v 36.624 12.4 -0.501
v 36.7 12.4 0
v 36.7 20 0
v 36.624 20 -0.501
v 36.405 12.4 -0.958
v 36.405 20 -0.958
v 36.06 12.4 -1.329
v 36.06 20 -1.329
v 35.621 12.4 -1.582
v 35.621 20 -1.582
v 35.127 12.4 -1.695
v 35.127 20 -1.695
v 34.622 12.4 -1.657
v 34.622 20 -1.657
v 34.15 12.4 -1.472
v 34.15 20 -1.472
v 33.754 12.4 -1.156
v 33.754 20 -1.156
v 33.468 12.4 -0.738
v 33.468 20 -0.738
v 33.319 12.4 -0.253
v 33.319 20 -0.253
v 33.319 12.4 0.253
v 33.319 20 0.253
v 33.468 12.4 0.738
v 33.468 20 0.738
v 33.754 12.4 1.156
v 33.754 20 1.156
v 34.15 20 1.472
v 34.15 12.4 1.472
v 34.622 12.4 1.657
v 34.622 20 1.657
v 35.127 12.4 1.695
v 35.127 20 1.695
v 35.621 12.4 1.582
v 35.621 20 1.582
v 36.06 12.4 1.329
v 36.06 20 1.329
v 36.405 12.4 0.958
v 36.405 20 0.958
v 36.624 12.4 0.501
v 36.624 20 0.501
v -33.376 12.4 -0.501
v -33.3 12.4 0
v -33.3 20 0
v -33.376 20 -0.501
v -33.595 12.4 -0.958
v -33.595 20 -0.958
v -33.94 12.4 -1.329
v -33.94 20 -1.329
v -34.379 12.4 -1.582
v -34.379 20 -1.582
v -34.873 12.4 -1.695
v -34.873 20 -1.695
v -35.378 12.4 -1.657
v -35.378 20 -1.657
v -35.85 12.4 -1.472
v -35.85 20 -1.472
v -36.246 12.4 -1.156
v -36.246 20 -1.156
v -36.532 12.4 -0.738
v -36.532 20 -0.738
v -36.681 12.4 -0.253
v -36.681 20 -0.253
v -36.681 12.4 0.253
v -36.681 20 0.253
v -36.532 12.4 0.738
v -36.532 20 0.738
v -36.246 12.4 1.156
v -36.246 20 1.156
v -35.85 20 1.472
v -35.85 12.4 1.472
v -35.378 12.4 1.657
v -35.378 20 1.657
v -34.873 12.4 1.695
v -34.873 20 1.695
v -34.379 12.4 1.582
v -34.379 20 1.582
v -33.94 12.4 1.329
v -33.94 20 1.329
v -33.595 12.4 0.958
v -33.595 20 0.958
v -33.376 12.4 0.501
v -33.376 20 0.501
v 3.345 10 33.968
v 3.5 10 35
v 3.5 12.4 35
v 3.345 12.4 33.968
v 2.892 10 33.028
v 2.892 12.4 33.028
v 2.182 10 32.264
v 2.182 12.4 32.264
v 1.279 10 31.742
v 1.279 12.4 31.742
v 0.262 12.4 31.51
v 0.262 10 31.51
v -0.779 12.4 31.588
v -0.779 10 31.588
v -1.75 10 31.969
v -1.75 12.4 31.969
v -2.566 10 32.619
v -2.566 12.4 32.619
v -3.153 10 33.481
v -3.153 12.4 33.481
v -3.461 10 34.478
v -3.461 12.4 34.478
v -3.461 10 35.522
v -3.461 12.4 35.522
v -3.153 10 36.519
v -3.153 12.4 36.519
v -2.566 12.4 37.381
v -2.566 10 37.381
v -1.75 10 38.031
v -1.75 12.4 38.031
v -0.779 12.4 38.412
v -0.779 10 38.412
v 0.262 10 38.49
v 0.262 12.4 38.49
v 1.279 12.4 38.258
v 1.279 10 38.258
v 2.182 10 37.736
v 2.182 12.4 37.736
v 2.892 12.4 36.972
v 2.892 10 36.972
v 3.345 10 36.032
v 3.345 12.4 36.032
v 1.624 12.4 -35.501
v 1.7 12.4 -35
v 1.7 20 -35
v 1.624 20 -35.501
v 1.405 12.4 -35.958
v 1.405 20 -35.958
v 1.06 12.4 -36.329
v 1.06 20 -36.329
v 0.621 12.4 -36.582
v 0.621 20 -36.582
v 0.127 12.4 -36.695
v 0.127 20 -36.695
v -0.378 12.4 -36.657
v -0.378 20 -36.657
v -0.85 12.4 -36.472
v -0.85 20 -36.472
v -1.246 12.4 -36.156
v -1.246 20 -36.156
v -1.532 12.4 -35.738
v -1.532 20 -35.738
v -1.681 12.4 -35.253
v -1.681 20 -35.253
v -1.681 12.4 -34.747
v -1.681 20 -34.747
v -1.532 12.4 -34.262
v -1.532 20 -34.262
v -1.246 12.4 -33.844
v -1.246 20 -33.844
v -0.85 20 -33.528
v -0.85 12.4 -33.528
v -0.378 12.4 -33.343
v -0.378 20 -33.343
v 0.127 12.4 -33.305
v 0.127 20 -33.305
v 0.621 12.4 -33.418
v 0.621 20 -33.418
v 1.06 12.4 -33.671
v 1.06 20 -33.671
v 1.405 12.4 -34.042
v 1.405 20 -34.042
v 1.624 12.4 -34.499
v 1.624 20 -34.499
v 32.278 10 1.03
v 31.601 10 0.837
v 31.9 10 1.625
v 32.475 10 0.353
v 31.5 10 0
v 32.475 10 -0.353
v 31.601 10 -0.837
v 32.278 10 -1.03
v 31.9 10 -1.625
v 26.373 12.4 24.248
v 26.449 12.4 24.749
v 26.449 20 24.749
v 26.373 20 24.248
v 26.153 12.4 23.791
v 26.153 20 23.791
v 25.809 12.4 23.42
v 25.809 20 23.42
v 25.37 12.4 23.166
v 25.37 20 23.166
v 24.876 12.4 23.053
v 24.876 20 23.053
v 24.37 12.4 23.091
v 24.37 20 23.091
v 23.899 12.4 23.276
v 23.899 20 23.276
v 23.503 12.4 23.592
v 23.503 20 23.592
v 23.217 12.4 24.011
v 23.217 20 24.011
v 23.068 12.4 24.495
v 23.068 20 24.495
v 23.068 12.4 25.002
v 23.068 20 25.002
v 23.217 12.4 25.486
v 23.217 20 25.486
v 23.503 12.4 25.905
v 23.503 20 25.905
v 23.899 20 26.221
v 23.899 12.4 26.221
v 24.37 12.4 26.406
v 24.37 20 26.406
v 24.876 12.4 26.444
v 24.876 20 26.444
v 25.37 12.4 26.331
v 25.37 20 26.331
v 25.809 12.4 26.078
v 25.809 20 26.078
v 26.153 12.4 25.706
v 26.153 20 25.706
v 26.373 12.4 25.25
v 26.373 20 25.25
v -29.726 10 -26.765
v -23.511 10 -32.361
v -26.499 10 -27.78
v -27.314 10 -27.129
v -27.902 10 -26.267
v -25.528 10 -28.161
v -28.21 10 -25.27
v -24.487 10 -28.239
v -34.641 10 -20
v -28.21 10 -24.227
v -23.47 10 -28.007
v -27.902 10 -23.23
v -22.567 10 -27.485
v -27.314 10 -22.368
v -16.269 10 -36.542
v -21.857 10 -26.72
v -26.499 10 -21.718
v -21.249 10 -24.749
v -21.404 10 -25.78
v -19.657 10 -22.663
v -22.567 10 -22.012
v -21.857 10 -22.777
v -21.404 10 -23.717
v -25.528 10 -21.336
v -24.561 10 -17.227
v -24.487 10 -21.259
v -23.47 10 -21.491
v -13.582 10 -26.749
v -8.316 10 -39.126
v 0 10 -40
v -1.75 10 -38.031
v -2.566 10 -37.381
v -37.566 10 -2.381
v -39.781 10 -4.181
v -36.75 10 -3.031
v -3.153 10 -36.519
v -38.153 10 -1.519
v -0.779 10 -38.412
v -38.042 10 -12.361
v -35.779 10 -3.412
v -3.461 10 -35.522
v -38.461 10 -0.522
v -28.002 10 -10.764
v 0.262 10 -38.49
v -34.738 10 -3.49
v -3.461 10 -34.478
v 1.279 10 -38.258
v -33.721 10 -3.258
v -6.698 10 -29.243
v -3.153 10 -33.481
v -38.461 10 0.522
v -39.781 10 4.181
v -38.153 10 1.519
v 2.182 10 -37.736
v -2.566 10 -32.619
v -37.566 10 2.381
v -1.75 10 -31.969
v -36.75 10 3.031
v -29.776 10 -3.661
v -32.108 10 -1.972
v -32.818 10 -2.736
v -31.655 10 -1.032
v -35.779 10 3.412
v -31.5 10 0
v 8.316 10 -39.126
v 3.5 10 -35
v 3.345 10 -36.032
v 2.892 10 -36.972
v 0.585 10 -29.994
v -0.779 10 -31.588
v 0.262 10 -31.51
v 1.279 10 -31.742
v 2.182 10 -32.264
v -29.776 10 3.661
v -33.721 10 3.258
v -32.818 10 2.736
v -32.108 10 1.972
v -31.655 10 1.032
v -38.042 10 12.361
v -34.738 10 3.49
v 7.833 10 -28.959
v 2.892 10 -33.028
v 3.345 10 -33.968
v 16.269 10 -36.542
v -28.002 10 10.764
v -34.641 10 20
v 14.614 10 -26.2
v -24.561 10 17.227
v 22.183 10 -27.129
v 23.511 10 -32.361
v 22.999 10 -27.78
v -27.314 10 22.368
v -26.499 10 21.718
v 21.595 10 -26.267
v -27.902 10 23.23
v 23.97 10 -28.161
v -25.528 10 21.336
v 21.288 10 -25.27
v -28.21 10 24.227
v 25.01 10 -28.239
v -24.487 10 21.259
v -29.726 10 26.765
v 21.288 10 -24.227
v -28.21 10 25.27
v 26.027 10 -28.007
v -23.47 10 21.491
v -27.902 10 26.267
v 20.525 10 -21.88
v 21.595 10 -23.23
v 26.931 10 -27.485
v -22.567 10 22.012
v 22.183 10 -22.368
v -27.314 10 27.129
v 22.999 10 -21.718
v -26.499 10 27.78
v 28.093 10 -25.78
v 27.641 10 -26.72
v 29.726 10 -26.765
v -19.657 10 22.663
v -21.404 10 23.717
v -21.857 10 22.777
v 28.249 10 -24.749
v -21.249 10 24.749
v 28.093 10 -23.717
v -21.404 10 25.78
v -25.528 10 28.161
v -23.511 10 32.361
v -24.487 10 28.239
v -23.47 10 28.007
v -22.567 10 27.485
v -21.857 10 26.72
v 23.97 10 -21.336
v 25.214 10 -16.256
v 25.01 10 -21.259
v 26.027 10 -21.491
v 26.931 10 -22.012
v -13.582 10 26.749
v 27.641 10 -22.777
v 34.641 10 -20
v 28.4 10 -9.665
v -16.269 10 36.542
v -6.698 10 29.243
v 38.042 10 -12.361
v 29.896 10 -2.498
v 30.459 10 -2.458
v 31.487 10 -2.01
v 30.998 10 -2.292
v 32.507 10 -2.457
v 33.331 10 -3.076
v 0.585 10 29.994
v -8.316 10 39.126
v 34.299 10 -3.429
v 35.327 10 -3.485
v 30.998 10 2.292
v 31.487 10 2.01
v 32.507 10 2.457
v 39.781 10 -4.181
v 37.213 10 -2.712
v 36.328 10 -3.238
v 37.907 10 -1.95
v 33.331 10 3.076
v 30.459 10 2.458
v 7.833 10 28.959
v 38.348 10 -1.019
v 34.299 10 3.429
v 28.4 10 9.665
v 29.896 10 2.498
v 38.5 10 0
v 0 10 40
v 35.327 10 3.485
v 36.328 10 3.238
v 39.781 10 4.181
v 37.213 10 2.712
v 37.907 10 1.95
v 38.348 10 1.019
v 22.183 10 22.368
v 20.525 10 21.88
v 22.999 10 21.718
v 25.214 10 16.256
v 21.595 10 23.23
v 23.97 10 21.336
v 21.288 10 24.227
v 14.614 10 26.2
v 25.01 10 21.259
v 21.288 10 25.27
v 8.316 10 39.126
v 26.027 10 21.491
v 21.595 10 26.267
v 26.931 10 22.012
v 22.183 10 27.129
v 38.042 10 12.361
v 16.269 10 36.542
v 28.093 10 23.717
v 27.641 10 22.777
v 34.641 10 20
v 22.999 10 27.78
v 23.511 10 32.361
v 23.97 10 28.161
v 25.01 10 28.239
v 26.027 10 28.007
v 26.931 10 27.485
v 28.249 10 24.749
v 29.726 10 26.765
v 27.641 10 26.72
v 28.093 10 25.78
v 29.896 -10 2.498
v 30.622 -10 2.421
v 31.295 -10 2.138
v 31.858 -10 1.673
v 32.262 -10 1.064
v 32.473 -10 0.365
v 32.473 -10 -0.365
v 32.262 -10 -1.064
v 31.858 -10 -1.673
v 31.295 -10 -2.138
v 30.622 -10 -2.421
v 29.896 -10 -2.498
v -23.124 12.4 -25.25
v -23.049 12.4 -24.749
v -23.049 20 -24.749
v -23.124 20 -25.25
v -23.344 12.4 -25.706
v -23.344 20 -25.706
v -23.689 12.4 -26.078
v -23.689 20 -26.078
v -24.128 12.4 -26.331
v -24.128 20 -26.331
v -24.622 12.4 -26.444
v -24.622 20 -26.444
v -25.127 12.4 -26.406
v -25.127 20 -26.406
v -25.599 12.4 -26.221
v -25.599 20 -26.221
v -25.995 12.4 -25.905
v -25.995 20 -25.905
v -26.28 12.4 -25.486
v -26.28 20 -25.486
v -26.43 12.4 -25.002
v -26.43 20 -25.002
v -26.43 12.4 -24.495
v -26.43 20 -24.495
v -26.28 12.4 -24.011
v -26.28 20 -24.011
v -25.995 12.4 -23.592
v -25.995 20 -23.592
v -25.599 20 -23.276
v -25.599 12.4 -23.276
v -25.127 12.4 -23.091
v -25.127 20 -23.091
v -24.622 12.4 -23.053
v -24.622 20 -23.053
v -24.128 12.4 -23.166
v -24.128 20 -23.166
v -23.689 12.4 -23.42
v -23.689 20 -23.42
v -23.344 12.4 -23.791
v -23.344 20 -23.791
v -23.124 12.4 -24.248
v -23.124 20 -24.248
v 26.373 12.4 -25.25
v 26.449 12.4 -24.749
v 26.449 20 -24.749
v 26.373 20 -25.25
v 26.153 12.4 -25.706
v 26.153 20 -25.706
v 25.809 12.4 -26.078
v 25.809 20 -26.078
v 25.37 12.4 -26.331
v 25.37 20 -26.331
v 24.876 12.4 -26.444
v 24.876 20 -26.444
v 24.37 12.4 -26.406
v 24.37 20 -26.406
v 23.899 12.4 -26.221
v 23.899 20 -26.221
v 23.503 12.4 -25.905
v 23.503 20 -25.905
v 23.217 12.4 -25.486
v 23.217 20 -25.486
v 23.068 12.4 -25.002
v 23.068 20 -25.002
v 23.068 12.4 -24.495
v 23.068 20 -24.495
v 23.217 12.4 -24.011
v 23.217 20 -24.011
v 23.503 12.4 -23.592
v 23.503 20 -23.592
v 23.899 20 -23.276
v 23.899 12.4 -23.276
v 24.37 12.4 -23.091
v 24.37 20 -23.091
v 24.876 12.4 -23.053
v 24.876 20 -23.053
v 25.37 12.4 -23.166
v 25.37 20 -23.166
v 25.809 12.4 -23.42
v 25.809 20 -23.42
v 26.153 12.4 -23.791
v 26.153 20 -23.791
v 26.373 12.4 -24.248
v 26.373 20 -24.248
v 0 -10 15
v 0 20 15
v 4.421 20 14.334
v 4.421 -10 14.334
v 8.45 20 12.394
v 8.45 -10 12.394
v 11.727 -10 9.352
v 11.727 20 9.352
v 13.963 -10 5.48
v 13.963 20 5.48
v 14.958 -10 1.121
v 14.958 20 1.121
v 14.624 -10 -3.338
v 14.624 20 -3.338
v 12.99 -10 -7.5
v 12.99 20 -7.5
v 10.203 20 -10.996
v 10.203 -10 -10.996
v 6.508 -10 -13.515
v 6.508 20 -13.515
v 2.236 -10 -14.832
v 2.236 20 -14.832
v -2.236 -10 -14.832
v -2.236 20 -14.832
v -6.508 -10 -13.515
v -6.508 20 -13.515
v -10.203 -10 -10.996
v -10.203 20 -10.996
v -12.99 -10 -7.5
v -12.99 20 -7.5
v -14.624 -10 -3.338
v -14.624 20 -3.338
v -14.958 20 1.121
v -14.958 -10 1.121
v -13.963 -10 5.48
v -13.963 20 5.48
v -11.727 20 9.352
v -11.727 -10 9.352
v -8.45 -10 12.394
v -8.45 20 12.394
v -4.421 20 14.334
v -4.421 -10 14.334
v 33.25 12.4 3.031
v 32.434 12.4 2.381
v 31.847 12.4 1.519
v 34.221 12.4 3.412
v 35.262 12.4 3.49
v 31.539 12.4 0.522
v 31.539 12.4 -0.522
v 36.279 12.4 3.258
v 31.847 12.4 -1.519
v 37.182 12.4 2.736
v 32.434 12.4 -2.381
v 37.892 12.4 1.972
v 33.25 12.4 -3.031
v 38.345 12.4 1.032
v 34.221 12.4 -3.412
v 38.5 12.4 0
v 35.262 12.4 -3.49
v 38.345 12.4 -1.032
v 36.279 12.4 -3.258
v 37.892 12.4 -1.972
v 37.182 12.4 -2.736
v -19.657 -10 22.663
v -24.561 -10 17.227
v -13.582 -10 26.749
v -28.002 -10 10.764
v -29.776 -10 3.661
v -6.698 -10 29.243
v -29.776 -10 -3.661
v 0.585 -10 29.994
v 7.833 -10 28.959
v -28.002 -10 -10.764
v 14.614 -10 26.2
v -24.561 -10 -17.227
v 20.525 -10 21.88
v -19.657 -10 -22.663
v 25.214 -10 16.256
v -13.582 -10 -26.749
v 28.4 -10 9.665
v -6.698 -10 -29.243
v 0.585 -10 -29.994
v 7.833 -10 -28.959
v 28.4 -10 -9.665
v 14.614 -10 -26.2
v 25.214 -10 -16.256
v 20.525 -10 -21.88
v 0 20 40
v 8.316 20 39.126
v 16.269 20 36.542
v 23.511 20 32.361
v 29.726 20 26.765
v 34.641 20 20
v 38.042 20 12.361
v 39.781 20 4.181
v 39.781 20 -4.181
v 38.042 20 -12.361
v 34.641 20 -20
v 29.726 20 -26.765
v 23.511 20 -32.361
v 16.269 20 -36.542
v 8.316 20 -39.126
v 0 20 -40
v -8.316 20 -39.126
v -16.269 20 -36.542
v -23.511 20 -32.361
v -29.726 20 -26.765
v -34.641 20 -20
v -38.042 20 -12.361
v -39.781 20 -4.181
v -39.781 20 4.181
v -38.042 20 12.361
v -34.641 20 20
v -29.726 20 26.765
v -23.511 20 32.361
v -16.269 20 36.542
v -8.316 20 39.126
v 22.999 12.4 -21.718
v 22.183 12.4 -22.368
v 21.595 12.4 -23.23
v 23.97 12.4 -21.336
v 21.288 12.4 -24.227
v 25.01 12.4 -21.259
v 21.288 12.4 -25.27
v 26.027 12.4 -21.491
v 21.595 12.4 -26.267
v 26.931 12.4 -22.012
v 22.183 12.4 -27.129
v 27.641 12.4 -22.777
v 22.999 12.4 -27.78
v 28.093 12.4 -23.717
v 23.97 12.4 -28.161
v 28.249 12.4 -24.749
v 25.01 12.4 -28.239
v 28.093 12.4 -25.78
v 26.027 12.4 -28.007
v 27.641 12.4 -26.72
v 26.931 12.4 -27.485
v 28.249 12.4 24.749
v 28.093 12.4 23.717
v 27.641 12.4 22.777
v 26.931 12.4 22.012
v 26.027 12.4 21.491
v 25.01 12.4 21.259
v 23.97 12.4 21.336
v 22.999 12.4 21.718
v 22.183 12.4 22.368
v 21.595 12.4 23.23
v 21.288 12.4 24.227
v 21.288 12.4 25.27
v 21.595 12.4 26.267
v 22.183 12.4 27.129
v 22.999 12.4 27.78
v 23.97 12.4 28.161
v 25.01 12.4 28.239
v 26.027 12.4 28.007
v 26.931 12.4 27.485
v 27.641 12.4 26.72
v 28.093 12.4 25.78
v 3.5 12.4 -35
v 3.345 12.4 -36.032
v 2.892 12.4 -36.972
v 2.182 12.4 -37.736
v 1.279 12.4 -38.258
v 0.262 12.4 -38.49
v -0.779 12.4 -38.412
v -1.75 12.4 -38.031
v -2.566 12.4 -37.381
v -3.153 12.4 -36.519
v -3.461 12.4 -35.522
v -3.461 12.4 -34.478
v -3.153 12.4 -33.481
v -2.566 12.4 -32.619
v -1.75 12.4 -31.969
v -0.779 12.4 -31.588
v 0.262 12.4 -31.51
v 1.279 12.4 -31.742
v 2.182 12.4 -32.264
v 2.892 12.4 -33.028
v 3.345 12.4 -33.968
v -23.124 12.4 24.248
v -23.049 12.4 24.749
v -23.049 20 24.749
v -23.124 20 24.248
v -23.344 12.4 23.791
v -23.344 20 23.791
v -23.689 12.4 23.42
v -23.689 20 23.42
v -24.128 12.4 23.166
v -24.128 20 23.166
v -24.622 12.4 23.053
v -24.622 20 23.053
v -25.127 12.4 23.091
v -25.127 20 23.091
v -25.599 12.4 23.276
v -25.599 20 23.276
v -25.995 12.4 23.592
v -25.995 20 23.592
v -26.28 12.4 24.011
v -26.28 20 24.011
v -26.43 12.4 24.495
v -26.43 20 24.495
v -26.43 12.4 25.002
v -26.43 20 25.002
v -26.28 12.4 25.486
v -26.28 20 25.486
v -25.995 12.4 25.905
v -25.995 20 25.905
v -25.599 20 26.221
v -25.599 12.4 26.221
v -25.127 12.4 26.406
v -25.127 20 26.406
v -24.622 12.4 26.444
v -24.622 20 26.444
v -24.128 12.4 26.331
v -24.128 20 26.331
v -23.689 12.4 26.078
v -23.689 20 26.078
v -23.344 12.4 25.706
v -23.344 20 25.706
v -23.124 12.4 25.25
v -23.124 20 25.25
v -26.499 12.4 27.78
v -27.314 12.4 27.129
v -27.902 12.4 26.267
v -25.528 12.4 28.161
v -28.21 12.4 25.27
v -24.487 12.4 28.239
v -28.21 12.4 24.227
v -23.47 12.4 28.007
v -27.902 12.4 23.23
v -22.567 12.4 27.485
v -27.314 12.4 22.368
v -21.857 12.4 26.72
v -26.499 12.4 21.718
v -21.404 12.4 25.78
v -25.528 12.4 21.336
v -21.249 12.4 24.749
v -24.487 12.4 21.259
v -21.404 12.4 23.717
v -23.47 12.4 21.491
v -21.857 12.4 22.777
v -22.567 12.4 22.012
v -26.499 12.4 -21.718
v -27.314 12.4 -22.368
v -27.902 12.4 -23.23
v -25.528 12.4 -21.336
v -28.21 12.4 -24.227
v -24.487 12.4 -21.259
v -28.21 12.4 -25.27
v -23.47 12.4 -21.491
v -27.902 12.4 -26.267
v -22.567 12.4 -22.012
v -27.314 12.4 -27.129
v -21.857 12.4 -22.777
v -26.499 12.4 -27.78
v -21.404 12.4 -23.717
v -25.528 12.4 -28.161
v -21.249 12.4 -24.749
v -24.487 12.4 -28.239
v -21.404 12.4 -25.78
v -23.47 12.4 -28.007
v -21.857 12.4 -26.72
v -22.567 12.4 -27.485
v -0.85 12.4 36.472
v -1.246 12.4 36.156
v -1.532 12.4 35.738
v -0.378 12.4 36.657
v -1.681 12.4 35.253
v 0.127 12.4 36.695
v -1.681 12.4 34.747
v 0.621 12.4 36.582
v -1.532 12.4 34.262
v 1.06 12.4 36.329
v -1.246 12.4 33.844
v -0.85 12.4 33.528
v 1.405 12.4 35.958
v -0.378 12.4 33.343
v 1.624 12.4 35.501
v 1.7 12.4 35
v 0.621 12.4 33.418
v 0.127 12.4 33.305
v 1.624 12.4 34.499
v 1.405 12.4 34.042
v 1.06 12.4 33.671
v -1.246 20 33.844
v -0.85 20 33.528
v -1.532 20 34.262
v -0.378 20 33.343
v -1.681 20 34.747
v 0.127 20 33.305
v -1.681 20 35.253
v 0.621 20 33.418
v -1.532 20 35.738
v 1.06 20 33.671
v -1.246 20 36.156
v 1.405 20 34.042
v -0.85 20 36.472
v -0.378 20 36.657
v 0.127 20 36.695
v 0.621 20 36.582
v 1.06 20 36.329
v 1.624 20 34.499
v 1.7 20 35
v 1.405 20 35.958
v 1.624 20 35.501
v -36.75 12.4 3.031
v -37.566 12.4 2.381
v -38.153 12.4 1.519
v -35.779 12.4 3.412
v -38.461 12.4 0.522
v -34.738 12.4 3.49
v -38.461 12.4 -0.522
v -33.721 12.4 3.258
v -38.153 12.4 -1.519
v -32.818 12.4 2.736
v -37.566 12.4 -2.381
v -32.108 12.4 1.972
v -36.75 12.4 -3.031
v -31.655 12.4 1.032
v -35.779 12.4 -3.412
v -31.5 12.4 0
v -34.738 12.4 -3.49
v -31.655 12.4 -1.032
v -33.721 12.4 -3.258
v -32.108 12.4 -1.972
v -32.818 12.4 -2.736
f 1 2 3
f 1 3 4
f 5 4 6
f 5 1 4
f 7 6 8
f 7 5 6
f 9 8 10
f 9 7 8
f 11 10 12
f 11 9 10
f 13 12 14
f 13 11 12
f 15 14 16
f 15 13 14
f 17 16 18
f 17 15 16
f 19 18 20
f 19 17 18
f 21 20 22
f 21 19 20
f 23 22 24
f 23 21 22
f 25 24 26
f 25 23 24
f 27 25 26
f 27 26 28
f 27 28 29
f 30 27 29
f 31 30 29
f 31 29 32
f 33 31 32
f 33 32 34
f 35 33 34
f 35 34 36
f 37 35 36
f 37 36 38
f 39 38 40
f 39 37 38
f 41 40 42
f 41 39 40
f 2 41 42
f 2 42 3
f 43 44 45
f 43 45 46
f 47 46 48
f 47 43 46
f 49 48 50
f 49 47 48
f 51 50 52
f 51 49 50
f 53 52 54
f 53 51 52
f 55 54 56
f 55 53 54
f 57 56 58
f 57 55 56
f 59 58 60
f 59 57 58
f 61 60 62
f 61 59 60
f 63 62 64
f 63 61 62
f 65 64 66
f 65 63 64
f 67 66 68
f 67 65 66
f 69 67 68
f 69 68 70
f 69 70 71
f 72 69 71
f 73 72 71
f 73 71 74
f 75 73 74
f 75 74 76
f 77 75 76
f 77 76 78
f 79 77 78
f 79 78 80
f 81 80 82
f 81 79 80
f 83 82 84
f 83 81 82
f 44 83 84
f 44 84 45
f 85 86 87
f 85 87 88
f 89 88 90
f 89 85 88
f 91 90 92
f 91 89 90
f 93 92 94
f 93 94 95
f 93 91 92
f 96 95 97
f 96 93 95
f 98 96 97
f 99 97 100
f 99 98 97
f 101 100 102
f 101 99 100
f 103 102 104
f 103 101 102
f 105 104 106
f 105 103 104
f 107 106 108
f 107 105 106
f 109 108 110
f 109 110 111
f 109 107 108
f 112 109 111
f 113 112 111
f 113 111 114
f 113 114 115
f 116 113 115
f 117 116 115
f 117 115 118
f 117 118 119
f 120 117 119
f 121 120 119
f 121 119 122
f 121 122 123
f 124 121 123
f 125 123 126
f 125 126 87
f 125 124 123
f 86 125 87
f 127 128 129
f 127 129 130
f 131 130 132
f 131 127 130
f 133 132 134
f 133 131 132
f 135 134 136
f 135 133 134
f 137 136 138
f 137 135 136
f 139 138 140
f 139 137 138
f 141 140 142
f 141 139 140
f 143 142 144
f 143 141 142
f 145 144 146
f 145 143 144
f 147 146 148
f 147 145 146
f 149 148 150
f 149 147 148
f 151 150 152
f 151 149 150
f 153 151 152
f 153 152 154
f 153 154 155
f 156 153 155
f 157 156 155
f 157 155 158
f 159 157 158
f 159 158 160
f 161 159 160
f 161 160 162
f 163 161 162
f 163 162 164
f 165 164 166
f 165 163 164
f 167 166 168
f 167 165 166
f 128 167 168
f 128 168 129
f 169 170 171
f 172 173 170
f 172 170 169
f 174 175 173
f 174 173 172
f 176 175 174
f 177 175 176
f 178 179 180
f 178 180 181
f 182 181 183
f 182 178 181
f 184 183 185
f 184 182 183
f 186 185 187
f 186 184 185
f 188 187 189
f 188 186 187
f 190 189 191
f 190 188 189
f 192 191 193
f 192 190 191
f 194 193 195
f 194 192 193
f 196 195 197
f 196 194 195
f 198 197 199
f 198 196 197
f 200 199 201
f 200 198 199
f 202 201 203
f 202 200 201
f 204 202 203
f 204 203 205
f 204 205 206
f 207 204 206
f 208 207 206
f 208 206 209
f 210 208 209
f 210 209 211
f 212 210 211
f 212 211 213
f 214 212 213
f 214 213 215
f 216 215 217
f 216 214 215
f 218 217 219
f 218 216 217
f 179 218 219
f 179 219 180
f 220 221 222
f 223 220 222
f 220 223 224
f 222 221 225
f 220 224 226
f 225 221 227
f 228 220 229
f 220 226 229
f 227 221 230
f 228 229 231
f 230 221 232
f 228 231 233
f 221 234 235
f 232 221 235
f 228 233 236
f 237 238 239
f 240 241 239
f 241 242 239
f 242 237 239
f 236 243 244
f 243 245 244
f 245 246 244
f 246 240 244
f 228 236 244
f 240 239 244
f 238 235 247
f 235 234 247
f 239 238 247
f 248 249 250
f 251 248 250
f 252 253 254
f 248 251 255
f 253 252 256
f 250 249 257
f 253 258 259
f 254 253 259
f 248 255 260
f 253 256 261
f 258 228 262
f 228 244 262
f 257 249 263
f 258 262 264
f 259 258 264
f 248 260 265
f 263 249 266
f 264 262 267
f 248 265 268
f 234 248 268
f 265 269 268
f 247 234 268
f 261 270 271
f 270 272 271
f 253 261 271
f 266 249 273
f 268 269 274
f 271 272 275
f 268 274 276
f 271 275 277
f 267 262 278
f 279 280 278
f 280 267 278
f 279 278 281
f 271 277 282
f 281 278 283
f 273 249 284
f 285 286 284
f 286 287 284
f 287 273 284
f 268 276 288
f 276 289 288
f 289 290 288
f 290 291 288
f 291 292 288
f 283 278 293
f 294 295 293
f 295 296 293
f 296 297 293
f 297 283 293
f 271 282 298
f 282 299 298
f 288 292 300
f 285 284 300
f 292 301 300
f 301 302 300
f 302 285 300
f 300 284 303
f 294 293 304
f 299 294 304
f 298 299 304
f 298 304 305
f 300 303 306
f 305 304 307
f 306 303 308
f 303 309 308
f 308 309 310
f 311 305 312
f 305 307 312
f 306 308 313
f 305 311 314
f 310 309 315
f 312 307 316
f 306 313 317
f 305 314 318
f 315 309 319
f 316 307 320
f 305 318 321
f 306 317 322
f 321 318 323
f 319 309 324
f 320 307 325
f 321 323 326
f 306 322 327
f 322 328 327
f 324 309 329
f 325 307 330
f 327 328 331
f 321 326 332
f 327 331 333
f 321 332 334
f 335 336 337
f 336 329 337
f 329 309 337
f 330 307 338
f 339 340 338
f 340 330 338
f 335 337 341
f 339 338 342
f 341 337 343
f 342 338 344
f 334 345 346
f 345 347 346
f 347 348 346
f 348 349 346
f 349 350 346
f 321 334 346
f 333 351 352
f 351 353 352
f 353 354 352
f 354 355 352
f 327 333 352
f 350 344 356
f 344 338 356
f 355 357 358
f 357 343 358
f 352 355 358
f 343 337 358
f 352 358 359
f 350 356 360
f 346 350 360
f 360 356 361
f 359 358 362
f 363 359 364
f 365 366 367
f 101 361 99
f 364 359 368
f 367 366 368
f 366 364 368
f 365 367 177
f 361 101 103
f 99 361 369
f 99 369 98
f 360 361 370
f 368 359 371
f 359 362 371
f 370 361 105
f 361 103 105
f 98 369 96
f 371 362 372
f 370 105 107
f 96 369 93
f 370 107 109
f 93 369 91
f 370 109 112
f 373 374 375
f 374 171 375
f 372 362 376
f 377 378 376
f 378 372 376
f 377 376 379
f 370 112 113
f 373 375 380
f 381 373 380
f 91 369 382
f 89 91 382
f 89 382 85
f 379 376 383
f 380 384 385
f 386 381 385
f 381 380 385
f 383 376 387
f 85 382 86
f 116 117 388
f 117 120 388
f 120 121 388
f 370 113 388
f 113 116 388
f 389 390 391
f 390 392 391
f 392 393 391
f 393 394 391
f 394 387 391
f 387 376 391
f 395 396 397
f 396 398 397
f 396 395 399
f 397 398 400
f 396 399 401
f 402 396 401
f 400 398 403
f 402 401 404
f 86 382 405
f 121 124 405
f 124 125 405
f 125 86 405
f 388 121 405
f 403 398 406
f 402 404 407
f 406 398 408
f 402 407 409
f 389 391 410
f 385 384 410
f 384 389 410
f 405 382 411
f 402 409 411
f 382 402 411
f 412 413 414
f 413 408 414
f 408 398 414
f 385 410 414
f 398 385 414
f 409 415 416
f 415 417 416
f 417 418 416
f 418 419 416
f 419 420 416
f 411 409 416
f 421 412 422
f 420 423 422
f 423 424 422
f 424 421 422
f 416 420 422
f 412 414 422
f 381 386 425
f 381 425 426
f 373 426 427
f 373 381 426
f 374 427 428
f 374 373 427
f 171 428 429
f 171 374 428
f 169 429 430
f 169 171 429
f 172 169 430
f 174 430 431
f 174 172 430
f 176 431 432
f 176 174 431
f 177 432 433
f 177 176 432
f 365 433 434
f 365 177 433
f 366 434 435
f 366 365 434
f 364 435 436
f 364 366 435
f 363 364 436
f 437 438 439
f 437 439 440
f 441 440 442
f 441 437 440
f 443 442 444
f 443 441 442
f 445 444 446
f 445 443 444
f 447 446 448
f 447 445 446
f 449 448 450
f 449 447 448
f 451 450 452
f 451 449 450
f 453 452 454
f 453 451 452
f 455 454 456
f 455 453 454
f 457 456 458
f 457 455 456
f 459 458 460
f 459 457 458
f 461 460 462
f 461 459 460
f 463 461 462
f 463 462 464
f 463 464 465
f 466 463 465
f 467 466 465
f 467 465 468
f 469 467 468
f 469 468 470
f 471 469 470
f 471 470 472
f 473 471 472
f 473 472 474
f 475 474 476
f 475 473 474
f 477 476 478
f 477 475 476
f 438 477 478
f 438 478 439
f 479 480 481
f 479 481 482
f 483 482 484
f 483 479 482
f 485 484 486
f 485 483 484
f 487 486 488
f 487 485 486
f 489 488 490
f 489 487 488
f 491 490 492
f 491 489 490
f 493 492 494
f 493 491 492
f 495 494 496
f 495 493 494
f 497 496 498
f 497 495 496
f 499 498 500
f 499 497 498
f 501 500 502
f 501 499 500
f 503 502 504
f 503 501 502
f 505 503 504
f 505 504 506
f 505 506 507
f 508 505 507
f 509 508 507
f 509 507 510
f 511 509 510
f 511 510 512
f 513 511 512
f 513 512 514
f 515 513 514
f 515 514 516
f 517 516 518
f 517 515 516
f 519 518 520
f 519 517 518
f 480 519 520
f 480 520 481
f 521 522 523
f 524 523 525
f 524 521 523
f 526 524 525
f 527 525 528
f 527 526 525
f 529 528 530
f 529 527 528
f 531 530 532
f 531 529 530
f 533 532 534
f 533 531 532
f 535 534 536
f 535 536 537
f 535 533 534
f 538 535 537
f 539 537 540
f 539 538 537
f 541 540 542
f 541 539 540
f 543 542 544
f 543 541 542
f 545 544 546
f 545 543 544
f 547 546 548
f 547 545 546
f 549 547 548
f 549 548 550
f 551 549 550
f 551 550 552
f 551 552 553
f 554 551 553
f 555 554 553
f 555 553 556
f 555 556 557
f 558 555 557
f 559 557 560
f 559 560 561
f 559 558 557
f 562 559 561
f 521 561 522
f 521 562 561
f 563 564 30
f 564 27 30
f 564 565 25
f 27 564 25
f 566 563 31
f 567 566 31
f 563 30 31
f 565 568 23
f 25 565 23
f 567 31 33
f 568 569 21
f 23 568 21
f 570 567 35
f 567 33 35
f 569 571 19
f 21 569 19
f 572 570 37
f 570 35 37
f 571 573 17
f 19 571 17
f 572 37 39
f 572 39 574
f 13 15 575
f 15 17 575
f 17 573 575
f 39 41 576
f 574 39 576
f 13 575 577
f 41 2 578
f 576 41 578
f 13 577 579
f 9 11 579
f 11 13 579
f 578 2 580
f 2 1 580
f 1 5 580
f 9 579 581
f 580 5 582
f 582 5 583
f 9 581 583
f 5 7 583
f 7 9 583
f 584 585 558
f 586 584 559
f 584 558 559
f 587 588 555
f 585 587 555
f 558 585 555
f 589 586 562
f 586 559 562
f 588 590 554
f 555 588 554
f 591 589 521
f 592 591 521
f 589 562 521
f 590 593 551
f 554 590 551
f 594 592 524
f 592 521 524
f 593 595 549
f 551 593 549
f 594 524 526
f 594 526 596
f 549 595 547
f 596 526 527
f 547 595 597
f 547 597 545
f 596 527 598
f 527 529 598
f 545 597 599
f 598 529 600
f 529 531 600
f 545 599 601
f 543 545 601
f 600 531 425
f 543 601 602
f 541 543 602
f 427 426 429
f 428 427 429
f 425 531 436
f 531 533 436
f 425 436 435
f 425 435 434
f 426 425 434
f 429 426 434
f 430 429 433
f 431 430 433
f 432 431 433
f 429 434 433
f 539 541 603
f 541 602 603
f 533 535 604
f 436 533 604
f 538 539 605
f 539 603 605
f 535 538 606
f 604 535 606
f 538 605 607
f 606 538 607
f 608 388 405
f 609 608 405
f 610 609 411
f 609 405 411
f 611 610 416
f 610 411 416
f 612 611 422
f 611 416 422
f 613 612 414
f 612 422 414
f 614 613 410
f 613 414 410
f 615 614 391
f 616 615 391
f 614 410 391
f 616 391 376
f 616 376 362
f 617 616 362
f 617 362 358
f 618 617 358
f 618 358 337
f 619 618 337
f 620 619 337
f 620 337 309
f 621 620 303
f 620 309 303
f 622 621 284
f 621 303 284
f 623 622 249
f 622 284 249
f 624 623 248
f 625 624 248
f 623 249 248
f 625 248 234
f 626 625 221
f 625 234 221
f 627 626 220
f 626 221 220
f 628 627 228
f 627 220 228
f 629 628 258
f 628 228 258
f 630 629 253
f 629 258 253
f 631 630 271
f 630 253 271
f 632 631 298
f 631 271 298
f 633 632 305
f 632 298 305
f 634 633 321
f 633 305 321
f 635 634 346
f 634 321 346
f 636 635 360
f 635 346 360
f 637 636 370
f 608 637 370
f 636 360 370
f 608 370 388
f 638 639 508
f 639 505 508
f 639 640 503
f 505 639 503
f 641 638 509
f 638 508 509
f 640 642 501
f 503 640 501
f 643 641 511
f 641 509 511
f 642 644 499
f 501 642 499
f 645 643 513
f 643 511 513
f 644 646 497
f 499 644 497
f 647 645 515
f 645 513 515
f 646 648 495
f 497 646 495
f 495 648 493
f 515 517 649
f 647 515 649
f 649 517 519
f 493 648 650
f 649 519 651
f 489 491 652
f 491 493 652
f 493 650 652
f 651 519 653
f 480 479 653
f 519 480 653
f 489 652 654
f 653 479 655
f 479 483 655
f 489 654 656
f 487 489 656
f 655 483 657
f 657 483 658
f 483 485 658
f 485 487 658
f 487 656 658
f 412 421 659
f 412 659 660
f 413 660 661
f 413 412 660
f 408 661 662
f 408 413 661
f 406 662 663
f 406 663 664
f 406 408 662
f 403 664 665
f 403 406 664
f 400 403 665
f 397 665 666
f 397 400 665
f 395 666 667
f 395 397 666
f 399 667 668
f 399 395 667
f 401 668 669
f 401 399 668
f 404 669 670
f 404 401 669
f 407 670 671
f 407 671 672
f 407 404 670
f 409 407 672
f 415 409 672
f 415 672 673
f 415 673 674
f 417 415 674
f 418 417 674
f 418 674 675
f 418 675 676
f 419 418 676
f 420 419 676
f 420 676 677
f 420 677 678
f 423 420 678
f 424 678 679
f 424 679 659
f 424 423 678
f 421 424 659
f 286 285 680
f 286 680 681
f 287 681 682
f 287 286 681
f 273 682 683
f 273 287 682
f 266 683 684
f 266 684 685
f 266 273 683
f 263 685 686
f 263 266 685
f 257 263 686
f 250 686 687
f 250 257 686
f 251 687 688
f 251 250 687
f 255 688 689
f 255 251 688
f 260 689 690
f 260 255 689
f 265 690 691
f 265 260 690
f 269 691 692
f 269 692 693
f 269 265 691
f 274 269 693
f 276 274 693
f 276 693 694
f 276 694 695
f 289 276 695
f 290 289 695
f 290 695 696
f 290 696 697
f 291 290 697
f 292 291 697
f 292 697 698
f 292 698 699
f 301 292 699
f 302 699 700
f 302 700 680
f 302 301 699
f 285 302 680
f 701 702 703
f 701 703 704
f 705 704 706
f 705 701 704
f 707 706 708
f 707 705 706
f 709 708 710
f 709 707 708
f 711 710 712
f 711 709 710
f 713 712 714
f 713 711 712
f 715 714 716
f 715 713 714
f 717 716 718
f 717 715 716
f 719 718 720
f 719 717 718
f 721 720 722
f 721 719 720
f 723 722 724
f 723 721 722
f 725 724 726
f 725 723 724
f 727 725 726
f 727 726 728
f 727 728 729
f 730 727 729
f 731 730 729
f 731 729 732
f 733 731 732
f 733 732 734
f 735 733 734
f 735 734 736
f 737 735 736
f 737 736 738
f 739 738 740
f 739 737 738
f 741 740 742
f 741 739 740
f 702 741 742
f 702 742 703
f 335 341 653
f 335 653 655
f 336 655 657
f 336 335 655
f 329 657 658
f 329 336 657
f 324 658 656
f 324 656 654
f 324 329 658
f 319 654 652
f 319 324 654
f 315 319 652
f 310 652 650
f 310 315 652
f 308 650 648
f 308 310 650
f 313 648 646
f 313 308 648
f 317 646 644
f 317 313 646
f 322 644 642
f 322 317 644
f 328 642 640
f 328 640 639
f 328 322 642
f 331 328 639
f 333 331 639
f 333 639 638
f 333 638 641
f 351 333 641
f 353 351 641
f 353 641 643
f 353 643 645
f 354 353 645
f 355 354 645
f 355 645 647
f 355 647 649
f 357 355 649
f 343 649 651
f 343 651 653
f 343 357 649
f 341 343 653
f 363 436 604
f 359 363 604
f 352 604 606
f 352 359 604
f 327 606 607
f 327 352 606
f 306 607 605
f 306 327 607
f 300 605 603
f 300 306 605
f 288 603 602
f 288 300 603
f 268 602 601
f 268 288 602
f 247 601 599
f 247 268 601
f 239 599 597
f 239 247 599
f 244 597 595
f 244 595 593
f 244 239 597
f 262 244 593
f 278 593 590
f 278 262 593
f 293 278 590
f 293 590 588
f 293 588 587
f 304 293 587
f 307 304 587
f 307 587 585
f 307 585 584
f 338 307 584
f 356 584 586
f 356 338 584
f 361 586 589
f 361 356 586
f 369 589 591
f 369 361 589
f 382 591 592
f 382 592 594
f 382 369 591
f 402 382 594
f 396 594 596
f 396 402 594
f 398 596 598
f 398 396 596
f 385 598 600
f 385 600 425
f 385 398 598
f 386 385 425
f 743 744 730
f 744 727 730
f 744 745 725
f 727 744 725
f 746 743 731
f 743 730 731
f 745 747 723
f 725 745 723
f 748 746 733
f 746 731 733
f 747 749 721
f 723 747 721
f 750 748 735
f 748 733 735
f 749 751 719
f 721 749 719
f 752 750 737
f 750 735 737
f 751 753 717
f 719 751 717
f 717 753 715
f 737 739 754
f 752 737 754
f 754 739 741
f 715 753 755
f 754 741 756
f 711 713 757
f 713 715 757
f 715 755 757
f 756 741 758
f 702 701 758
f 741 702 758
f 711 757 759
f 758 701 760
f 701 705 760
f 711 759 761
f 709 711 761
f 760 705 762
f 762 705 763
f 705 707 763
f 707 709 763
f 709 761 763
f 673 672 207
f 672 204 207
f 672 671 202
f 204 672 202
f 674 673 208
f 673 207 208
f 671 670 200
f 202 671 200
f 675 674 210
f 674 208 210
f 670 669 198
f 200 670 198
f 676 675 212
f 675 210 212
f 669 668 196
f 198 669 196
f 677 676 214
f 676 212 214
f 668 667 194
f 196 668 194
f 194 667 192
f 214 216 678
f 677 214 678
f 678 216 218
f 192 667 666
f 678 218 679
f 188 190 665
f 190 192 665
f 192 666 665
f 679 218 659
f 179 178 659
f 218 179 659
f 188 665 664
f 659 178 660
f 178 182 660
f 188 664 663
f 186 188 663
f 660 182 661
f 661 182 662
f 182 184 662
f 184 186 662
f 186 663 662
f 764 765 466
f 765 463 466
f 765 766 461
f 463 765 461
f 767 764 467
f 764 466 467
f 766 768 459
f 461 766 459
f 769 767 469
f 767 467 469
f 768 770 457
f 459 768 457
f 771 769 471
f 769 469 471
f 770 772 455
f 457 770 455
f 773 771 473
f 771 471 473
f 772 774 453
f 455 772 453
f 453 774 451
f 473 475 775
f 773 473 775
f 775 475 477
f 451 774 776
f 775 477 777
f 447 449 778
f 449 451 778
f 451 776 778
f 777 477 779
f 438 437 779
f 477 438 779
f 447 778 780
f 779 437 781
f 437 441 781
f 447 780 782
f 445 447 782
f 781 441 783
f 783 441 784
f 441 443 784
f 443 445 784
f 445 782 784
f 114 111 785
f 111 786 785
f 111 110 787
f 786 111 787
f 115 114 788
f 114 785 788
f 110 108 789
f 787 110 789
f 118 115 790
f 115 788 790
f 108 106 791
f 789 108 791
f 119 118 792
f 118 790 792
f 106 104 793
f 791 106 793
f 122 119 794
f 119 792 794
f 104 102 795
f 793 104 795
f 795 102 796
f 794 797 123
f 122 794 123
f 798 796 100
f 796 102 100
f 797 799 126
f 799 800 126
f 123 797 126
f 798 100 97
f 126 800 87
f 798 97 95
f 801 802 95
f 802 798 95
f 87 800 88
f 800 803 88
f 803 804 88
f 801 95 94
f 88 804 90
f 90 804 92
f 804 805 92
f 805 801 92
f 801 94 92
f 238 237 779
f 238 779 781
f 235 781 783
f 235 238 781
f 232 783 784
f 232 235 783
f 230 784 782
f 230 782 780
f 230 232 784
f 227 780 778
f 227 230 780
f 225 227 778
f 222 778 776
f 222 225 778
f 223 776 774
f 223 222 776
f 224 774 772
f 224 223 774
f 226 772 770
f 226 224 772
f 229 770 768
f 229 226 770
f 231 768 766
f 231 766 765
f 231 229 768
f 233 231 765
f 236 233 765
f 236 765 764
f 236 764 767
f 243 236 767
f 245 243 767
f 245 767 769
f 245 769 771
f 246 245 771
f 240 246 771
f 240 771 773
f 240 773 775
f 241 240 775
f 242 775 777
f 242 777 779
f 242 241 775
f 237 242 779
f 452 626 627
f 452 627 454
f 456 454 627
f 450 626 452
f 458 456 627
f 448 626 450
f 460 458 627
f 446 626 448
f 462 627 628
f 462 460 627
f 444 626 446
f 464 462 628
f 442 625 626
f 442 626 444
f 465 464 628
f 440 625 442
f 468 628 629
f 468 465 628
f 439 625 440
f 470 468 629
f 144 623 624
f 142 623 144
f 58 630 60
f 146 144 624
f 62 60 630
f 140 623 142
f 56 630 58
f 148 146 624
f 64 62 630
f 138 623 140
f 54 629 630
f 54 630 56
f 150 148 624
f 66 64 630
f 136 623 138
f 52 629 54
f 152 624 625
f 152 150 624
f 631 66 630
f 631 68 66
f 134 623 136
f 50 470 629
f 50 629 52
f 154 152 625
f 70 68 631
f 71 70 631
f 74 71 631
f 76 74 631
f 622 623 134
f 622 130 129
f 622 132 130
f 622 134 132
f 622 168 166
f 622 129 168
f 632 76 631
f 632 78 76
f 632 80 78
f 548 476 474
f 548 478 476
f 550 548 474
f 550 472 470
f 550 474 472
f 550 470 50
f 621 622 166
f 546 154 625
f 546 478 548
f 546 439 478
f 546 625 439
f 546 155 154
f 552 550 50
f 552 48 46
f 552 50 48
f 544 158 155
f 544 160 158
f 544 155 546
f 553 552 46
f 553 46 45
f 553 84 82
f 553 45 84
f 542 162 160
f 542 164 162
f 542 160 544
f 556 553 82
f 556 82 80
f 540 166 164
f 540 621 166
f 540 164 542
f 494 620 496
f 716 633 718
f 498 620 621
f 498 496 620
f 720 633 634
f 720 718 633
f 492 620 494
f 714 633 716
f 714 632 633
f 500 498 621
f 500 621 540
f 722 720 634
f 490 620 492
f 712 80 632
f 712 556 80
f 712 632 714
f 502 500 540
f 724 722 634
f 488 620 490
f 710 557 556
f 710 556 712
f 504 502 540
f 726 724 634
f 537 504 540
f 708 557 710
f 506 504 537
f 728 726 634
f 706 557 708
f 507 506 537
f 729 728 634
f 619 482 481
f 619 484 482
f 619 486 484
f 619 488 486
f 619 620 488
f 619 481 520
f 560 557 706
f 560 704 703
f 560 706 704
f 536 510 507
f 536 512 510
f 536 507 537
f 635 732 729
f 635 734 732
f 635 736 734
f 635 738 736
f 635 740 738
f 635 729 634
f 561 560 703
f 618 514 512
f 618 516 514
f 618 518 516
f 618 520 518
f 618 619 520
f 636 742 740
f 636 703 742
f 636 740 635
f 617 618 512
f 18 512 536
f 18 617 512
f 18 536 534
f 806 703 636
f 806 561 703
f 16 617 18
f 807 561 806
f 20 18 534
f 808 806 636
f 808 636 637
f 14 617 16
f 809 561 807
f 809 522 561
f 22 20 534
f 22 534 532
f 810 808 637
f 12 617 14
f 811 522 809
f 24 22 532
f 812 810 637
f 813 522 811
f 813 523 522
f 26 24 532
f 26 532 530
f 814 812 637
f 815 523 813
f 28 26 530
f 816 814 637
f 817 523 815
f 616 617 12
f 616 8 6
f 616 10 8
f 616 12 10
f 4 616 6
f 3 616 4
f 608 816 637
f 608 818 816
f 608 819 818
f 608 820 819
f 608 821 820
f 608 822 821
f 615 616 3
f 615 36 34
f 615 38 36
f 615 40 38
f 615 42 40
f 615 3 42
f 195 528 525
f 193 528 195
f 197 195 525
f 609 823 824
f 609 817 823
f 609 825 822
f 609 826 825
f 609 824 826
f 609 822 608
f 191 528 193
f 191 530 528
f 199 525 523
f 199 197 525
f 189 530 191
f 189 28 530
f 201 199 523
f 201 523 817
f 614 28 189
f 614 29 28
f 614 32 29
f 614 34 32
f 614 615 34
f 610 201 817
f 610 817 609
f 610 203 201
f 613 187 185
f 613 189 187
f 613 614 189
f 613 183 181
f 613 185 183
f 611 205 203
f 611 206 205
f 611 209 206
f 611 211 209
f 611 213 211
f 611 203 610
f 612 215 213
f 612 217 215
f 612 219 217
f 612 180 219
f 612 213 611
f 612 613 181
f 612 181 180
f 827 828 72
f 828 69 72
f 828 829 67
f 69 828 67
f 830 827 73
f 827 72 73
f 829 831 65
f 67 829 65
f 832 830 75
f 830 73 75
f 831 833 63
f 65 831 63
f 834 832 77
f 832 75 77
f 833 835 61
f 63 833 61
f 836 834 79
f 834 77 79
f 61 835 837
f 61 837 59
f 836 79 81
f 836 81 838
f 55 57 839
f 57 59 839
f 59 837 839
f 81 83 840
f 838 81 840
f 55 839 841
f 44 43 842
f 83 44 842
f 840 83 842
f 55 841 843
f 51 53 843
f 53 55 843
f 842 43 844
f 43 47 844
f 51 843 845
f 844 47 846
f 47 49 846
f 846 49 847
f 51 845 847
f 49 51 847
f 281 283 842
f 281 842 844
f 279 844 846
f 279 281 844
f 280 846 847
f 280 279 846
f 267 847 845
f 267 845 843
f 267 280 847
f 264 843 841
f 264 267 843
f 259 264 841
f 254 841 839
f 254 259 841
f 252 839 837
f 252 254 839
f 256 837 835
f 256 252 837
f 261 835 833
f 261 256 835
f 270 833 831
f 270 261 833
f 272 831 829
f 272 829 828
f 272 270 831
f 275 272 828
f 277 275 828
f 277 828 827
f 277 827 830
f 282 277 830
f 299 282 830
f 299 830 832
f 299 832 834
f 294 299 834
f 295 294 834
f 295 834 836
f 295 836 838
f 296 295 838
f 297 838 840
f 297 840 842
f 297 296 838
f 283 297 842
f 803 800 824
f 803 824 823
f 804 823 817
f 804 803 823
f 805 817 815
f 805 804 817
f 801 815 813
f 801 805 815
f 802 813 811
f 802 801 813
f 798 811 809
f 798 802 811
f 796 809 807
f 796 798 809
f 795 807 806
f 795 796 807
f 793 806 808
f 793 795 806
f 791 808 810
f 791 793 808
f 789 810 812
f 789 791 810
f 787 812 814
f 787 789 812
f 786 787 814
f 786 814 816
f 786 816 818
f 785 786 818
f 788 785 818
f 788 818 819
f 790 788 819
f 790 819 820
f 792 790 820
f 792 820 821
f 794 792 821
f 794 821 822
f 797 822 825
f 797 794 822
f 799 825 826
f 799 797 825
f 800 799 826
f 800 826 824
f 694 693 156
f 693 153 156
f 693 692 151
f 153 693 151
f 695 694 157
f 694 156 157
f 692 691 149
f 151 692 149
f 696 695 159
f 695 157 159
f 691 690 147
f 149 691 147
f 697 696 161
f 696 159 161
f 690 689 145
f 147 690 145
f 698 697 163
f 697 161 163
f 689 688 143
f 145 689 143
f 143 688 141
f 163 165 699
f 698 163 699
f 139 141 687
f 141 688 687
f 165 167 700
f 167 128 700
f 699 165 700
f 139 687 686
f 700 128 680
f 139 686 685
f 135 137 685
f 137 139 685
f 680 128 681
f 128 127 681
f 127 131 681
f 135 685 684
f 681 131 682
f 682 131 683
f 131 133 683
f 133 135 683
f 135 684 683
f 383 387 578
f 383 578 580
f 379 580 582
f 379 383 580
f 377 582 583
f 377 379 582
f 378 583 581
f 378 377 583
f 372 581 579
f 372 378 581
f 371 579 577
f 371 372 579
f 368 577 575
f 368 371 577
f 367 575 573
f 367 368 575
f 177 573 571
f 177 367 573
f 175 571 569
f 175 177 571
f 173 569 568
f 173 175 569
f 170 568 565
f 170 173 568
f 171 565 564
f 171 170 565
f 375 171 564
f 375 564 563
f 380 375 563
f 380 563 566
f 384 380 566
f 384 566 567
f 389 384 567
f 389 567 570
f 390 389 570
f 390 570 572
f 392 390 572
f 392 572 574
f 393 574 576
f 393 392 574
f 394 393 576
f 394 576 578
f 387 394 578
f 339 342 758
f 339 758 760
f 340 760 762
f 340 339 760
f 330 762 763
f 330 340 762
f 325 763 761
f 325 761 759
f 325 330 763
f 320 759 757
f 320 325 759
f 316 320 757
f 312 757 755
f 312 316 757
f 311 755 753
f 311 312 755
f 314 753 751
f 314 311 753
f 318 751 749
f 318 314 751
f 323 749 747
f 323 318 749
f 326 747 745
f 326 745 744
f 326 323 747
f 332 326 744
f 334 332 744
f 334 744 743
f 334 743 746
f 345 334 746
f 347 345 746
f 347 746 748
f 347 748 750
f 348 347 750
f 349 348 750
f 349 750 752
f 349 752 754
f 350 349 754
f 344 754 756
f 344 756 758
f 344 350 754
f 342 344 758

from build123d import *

# Parameters (mm, degrees)
CROQUIS1_R                                     = 15
SALIENTE_EXTRUIR1_DEPTH                        = 10
CROQUIS2_R                                     = 40
CROQUIS2_R_2                                   = 15
SALIENTE_EXTRUIR2_DEPTH                        = 10
REFRENTADO_START                               = 10
REFRENTADO_PARA_TORNILLO_CON_CABEZA_2_R        = 3.5
REFRENTADO_PARA_TORNILLO_CON_CABEZA_TRON_DEPTH = 2.4
REFRENTADO_START_2                             = 12.4
REFRENTADO_PARA_TORNILLO_CON_CABEZA_3_OU_R     = 1.7
REFRENTADO_PARA_TORNILLO_CON_CABEZA_3_DEPTH    = 7.6


# Read off the part's stored shape, not the designer's step: Refrentado para tornillo con cabeza troncocónica de M31
with BuildPart() as part:
    # Croquis1 → Saliente-Extruir1 (new, symmetric)
    with BuildSketch(Plane(origin=(0, 0, 0), x_dir=(1, 0, 0), z_dir=(0, 1, 0))):
        with BuildLine():
            ThreePointArc((29.895833333, 2.497828918), (-30, 0), (29.895833333, -2.497828918))
            ThreePointArc((29.895833333, -2.497828918), (32.5, 0), (29.895833333, 2.497828918))
        make_face()
        with Locations(Location((0, 0, 0), (0, 0, 270))):
            Circle(CROQUIS1_R, mode=Mode.SUBTRACT)
    extrude(amount=SALIENTE_EXTRUIR1_DEPTH, both=True)

    # Croquis2 → Saliente-Extruir2 (add)
    with BuildSketch(Plane(origin=(0, 10, 0), x_dir=(1, 0, 0), z_dir=(0, 1, 0))):
        with Locations(Location((0, 0, 0), (0, 0, 270))):
            Circle(CROQUIS2_R)
        with Locations(Location((0, 0, 0), (0, 0, 270))):
            Circle(CROQUIS2_R_2, mode=Mode.SUBTRACT)
    extrude(amount=SALIENTE_EXTRUIR2_DEPTH)

    # Refrentado para tornillo con cabeza  2 → Refrentado para tornillo con cabeza troncocónica de M31 (cut)
    with BuildSketch(Plane(origin=(0, 0, 0), x_dir=(1, 0, 0), z_dir=(0, 1, 0)).offset(REFRENTADO_START)):
        with Locations((-24.748737342, -24.748737342)):
            Circle(REFRENTADO_PARA_TORNILLO_CON_CABEZA_2_R)
        with Locations((-35, 0)):
            Circle(REFRENTADO_PARA_TORNILLO_CON_CABEZA_2_R)
        with Locations((-24.748737342, 24.748737342)):
            Circle(REFRENTADO_PARA_TORNILLO_CON_CABEZA_2_R)
        with Locations((0, 35)):
            Circle(REFRENTADO_PARA_TORNILLO_CON_CABEZA_2_R)
        with Locations((24.748737342, 24.748737342)):
            Circle(REFRENTADO_PARA_TORNILLO_CON_CABEZA_2_R)
        with Locations((35, 0)):
            Circle(REFRENTADO_PARA_TORNILLO_CON_CABEZA_2_R)
        with Locations((24.748737342, -24.748737342)):
            Circle(REFRENTADO_PARA_TORNILLO_CON_CABEZA_2_R)
        with Locations((0, -35)):
            Circle(REFRENTADO_PARA_TORNILLO_CON_CABEZA_2_R)
    extrude(amount=REFRENTADO_PARA_TORNILLO_CON_CABEZA_TRON_DEPTH, mode=Mode.SUBTRACT)

    # Refrentado para tornillo con cabeza 3 ou → Refrentado para tornillo con cabeza  3 (cut)
    with BuildSketch(Plane(origin=(0, 0, 0), x_dir=(1, 0, 0), z_dir=(0, 1, 0)).offset(REFRENTADO_START_2)):
        with Locations((-24.748737342, -24.748737342)):
            Circle(REFRENTADO_PARA_TORNILLO_CON_CABEZA_3_OU_R)
        with Locations((-35, 0)):
            Circle(REFRENTADO_PARA_TORNILLO_CON_CABEZA_3_OU_R)
        with Locations((-24.748737342, 24.748737342)):
            Circle(REFRENTADO_PARA_TORNILLO_CON_CABEZA_3_OU_R)
        with Locations((0, 35)):
            Circle(REFRENTADO_PARA_TORNILLO_CON_CABEZA_3_OU_R)
        with Locations((24.748737342, 24.748737342)):
            Circle(REFRENTADO_PARA_TORNILLO_CON_CABEZA_3_OU_R)
        with Locations((35, 0)):
            Circle(REFRENTADO_PARA_TORNILLO_CON_CABEZA_3_OU_R)
        with Locations((24.748737342, -24.748737342)):
            Circle(REFRENTADO_PARA_TORNILLO_CON_CABEZA_3_OU_R)
        with Locations((0, -35)):
            Circle(REFRENTADO_PARA_TORNILLO_CON_CABEZA_3_OU_R)
    extrude(amount=REFRENTADO_PARA_TORNILLO_CON_CABEZA_3_DEPTH, mode=Mode.SUBTRACT)


solid = part.part
